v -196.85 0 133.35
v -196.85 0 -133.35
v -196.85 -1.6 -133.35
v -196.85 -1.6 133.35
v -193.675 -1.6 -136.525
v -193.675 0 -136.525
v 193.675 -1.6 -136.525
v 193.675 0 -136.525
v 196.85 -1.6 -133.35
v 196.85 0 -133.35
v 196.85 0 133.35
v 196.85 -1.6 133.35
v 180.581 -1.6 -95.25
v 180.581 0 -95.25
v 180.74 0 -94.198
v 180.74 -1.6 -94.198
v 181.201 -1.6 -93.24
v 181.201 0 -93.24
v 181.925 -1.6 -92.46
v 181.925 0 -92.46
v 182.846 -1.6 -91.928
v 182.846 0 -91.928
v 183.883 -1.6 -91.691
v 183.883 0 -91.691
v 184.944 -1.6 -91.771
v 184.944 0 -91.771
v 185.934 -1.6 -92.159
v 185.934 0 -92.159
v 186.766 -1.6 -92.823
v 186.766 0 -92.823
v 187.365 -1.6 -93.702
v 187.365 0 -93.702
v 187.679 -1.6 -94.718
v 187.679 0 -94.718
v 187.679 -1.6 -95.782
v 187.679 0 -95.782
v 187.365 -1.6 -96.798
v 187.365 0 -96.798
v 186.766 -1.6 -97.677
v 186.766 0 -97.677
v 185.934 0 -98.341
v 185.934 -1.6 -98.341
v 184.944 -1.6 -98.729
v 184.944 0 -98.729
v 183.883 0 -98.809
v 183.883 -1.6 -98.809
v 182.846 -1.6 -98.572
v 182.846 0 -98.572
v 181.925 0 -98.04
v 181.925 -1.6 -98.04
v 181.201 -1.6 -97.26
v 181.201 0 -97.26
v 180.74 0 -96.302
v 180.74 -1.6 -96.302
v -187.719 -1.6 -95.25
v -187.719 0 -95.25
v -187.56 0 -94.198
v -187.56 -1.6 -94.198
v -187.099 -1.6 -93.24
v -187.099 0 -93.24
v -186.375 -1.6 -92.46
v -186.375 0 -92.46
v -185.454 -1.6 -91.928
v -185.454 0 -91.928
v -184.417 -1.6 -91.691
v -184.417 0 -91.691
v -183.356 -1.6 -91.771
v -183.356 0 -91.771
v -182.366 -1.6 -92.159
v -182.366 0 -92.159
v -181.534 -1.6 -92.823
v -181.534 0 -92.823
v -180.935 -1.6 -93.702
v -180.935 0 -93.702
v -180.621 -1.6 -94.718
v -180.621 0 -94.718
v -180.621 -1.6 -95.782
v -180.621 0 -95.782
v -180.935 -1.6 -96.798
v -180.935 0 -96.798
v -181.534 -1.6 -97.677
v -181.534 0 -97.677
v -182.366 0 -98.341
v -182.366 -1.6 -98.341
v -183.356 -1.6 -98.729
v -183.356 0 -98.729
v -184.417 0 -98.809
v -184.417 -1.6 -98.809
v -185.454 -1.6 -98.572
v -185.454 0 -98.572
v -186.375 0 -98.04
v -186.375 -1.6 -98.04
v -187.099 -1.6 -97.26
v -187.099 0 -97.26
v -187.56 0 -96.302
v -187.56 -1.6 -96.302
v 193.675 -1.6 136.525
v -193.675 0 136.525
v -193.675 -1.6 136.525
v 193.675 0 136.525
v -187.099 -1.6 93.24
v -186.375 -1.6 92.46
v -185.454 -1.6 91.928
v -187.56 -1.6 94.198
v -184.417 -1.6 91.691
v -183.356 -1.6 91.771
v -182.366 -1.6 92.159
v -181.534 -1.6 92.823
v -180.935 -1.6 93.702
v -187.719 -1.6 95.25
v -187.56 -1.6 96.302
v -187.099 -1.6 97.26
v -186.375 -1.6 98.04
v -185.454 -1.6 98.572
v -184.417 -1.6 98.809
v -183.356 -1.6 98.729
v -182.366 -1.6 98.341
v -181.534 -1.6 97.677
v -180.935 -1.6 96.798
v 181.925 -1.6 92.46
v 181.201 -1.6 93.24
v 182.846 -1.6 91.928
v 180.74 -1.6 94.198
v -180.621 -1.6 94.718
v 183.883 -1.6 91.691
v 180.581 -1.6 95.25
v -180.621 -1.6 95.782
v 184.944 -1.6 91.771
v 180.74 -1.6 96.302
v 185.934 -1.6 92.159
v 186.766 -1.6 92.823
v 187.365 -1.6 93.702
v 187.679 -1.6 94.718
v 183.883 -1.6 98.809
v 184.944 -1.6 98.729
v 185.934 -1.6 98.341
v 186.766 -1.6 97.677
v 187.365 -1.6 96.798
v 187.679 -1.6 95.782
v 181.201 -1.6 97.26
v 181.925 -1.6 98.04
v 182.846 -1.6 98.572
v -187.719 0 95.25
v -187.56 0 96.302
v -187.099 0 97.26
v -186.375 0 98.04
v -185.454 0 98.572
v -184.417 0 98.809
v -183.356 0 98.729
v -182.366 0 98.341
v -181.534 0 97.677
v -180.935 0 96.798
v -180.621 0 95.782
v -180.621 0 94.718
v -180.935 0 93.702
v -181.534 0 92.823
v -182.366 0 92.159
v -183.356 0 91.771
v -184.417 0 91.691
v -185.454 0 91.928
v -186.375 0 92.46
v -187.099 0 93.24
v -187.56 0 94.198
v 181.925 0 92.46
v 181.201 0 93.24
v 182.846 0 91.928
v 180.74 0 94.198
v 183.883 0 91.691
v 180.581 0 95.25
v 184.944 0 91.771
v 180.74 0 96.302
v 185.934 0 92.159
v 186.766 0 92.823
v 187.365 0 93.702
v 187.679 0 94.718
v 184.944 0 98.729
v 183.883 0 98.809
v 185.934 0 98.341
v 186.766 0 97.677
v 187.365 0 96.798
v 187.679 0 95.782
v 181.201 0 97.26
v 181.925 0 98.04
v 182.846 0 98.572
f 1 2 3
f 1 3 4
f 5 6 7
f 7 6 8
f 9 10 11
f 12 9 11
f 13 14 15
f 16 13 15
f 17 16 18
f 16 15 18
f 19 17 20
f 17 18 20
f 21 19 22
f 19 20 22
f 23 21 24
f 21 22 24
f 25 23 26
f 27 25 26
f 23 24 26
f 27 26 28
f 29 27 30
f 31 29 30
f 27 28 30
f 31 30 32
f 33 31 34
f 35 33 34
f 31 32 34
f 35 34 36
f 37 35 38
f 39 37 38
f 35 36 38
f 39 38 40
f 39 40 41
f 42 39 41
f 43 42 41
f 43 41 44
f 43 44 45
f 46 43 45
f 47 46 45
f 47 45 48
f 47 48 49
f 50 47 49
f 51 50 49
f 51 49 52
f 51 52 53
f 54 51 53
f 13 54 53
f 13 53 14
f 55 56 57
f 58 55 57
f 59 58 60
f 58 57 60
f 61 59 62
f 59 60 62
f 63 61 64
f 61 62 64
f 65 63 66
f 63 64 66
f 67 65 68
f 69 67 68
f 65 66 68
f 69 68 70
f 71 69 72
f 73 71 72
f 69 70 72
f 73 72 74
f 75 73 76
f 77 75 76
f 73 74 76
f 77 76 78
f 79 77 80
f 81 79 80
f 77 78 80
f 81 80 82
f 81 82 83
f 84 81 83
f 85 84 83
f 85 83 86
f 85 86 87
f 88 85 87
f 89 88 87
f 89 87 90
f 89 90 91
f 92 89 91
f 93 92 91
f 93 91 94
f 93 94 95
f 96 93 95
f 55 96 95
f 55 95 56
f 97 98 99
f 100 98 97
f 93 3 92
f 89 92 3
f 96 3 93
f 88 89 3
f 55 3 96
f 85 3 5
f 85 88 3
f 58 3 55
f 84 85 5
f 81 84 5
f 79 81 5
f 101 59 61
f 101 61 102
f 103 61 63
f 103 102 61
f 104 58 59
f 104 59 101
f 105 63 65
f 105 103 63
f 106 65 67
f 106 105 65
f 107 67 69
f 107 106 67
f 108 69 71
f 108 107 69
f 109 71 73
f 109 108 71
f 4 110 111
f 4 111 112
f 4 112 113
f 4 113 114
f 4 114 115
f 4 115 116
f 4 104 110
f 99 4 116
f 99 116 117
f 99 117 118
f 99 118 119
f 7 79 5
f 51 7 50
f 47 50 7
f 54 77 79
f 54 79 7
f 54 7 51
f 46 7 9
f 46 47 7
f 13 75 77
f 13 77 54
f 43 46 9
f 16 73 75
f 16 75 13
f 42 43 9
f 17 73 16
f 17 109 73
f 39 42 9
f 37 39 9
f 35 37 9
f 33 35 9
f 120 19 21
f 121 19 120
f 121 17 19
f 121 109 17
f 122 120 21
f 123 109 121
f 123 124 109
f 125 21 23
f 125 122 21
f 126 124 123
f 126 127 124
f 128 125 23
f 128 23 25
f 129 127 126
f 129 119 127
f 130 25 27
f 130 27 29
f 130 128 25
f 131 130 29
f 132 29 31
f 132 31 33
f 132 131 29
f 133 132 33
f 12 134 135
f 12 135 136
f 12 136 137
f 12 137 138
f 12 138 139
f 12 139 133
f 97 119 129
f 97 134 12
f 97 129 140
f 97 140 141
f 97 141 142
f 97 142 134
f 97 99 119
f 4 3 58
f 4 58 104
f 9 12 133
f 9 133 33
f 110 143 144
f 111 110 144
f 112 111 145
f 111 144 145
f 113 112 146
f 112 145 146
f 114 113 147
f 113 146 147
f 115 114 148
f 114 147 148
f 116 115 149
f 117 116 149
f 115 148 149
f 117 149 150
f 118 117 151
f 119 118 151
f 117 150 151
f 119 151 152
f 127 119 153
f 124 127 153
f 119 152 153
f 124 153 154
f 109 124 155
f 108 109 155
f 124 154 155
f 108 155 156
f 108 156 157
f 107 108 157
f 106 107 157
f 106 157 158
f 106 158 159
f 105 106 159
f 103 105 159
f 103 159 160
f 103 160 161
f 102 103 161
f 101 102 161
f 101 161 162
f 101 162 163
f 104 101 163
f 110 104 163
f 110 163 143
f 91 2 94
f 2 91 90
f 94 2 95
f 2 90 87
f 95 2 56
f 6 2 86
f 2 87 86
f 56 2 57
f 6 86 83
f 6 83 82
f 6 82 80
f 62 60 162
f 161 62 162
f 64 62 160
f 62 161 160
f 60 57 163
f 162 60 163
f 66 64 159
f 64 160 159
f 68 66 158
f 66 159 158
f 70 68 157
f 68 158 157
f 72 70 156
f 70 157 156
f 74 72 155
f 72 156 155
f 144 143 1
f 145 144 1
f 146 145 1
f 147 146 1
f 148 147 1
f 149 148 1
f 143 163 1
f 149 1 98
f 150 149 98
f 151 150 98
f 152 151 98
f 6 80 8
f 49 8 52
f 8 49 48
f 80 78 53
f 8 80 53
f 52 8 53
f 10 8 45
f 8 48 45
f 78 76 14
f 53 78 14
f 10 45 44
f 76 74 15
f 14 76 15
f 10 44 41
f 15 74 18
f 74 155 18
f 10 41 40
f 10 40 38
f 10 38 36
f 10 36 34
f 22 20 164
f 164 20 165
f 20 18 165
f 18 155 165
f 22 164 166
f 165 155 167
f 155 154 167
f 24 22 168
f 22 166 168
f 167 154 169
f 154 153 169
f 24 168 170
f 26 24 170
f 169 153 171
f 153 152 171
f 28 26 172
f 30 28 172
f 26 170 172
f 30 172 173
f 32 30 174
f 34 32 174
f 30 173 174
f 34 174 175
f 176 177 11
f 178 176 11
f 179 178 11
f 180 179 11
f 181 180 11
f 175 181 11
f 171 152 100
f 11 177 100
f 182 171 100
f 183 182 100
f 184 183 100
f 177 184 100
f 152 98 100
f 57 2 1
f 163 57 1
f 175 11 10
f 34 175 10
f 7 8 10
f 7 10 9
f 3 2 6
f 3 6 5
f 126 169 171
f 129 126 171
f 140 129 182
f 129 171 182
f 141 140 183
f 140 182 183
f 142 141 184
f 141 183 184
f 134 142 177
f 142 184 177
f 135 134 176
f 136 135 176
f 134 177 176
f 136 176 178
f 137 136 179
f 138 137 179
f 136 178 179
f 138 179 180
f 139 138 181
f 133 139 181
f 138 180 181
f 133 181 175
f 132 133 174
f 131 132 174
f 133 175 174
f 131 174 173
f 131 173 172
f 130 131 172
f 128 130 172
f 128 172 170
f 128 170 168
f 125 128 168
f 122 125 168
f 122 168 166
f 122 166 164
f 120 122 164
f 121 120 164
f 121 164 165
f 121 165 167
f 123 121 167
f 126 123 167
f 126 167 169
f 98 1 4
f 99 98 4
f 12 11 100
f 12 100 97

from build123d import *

# Parameters (mm, degrees)
F0_W     = 393.7
F0_H     = 273.05
F1_DEPTH = 1.6002
F2_SIZE  = 3.175
F4_D     = 7.1374


with BuildPart() as f1:
    # F0 (on Front) → F1 (new body)
    with BuildSketch(Plane.XZ):
        Rectangle(F0_W, F0_H)
    extrude(amount=F1_DEPTH)

    # F2
    f2_edges = [f1.edges().sort_by_distance(p)[0] for p in [
        (-196.85, -0.8001, 136.525),
        (-196.85, -0.8001, -136.525),
        (196.85, -0.8001, -136.525),
        (196.85, -0.8001, 136.525),
    ]]
    chamfer(f2_edges, length=F2_SIZE)

    # F4 (through all)
    with Locations(Plane.XZ.offset(1.6002)):
        with Locations((-184.15, 95.25), (184.15, 95.25), (184.15, -95.25), (-184.15, -95.25)):
            Hole(F4_D / 2)


solid = f1.part
